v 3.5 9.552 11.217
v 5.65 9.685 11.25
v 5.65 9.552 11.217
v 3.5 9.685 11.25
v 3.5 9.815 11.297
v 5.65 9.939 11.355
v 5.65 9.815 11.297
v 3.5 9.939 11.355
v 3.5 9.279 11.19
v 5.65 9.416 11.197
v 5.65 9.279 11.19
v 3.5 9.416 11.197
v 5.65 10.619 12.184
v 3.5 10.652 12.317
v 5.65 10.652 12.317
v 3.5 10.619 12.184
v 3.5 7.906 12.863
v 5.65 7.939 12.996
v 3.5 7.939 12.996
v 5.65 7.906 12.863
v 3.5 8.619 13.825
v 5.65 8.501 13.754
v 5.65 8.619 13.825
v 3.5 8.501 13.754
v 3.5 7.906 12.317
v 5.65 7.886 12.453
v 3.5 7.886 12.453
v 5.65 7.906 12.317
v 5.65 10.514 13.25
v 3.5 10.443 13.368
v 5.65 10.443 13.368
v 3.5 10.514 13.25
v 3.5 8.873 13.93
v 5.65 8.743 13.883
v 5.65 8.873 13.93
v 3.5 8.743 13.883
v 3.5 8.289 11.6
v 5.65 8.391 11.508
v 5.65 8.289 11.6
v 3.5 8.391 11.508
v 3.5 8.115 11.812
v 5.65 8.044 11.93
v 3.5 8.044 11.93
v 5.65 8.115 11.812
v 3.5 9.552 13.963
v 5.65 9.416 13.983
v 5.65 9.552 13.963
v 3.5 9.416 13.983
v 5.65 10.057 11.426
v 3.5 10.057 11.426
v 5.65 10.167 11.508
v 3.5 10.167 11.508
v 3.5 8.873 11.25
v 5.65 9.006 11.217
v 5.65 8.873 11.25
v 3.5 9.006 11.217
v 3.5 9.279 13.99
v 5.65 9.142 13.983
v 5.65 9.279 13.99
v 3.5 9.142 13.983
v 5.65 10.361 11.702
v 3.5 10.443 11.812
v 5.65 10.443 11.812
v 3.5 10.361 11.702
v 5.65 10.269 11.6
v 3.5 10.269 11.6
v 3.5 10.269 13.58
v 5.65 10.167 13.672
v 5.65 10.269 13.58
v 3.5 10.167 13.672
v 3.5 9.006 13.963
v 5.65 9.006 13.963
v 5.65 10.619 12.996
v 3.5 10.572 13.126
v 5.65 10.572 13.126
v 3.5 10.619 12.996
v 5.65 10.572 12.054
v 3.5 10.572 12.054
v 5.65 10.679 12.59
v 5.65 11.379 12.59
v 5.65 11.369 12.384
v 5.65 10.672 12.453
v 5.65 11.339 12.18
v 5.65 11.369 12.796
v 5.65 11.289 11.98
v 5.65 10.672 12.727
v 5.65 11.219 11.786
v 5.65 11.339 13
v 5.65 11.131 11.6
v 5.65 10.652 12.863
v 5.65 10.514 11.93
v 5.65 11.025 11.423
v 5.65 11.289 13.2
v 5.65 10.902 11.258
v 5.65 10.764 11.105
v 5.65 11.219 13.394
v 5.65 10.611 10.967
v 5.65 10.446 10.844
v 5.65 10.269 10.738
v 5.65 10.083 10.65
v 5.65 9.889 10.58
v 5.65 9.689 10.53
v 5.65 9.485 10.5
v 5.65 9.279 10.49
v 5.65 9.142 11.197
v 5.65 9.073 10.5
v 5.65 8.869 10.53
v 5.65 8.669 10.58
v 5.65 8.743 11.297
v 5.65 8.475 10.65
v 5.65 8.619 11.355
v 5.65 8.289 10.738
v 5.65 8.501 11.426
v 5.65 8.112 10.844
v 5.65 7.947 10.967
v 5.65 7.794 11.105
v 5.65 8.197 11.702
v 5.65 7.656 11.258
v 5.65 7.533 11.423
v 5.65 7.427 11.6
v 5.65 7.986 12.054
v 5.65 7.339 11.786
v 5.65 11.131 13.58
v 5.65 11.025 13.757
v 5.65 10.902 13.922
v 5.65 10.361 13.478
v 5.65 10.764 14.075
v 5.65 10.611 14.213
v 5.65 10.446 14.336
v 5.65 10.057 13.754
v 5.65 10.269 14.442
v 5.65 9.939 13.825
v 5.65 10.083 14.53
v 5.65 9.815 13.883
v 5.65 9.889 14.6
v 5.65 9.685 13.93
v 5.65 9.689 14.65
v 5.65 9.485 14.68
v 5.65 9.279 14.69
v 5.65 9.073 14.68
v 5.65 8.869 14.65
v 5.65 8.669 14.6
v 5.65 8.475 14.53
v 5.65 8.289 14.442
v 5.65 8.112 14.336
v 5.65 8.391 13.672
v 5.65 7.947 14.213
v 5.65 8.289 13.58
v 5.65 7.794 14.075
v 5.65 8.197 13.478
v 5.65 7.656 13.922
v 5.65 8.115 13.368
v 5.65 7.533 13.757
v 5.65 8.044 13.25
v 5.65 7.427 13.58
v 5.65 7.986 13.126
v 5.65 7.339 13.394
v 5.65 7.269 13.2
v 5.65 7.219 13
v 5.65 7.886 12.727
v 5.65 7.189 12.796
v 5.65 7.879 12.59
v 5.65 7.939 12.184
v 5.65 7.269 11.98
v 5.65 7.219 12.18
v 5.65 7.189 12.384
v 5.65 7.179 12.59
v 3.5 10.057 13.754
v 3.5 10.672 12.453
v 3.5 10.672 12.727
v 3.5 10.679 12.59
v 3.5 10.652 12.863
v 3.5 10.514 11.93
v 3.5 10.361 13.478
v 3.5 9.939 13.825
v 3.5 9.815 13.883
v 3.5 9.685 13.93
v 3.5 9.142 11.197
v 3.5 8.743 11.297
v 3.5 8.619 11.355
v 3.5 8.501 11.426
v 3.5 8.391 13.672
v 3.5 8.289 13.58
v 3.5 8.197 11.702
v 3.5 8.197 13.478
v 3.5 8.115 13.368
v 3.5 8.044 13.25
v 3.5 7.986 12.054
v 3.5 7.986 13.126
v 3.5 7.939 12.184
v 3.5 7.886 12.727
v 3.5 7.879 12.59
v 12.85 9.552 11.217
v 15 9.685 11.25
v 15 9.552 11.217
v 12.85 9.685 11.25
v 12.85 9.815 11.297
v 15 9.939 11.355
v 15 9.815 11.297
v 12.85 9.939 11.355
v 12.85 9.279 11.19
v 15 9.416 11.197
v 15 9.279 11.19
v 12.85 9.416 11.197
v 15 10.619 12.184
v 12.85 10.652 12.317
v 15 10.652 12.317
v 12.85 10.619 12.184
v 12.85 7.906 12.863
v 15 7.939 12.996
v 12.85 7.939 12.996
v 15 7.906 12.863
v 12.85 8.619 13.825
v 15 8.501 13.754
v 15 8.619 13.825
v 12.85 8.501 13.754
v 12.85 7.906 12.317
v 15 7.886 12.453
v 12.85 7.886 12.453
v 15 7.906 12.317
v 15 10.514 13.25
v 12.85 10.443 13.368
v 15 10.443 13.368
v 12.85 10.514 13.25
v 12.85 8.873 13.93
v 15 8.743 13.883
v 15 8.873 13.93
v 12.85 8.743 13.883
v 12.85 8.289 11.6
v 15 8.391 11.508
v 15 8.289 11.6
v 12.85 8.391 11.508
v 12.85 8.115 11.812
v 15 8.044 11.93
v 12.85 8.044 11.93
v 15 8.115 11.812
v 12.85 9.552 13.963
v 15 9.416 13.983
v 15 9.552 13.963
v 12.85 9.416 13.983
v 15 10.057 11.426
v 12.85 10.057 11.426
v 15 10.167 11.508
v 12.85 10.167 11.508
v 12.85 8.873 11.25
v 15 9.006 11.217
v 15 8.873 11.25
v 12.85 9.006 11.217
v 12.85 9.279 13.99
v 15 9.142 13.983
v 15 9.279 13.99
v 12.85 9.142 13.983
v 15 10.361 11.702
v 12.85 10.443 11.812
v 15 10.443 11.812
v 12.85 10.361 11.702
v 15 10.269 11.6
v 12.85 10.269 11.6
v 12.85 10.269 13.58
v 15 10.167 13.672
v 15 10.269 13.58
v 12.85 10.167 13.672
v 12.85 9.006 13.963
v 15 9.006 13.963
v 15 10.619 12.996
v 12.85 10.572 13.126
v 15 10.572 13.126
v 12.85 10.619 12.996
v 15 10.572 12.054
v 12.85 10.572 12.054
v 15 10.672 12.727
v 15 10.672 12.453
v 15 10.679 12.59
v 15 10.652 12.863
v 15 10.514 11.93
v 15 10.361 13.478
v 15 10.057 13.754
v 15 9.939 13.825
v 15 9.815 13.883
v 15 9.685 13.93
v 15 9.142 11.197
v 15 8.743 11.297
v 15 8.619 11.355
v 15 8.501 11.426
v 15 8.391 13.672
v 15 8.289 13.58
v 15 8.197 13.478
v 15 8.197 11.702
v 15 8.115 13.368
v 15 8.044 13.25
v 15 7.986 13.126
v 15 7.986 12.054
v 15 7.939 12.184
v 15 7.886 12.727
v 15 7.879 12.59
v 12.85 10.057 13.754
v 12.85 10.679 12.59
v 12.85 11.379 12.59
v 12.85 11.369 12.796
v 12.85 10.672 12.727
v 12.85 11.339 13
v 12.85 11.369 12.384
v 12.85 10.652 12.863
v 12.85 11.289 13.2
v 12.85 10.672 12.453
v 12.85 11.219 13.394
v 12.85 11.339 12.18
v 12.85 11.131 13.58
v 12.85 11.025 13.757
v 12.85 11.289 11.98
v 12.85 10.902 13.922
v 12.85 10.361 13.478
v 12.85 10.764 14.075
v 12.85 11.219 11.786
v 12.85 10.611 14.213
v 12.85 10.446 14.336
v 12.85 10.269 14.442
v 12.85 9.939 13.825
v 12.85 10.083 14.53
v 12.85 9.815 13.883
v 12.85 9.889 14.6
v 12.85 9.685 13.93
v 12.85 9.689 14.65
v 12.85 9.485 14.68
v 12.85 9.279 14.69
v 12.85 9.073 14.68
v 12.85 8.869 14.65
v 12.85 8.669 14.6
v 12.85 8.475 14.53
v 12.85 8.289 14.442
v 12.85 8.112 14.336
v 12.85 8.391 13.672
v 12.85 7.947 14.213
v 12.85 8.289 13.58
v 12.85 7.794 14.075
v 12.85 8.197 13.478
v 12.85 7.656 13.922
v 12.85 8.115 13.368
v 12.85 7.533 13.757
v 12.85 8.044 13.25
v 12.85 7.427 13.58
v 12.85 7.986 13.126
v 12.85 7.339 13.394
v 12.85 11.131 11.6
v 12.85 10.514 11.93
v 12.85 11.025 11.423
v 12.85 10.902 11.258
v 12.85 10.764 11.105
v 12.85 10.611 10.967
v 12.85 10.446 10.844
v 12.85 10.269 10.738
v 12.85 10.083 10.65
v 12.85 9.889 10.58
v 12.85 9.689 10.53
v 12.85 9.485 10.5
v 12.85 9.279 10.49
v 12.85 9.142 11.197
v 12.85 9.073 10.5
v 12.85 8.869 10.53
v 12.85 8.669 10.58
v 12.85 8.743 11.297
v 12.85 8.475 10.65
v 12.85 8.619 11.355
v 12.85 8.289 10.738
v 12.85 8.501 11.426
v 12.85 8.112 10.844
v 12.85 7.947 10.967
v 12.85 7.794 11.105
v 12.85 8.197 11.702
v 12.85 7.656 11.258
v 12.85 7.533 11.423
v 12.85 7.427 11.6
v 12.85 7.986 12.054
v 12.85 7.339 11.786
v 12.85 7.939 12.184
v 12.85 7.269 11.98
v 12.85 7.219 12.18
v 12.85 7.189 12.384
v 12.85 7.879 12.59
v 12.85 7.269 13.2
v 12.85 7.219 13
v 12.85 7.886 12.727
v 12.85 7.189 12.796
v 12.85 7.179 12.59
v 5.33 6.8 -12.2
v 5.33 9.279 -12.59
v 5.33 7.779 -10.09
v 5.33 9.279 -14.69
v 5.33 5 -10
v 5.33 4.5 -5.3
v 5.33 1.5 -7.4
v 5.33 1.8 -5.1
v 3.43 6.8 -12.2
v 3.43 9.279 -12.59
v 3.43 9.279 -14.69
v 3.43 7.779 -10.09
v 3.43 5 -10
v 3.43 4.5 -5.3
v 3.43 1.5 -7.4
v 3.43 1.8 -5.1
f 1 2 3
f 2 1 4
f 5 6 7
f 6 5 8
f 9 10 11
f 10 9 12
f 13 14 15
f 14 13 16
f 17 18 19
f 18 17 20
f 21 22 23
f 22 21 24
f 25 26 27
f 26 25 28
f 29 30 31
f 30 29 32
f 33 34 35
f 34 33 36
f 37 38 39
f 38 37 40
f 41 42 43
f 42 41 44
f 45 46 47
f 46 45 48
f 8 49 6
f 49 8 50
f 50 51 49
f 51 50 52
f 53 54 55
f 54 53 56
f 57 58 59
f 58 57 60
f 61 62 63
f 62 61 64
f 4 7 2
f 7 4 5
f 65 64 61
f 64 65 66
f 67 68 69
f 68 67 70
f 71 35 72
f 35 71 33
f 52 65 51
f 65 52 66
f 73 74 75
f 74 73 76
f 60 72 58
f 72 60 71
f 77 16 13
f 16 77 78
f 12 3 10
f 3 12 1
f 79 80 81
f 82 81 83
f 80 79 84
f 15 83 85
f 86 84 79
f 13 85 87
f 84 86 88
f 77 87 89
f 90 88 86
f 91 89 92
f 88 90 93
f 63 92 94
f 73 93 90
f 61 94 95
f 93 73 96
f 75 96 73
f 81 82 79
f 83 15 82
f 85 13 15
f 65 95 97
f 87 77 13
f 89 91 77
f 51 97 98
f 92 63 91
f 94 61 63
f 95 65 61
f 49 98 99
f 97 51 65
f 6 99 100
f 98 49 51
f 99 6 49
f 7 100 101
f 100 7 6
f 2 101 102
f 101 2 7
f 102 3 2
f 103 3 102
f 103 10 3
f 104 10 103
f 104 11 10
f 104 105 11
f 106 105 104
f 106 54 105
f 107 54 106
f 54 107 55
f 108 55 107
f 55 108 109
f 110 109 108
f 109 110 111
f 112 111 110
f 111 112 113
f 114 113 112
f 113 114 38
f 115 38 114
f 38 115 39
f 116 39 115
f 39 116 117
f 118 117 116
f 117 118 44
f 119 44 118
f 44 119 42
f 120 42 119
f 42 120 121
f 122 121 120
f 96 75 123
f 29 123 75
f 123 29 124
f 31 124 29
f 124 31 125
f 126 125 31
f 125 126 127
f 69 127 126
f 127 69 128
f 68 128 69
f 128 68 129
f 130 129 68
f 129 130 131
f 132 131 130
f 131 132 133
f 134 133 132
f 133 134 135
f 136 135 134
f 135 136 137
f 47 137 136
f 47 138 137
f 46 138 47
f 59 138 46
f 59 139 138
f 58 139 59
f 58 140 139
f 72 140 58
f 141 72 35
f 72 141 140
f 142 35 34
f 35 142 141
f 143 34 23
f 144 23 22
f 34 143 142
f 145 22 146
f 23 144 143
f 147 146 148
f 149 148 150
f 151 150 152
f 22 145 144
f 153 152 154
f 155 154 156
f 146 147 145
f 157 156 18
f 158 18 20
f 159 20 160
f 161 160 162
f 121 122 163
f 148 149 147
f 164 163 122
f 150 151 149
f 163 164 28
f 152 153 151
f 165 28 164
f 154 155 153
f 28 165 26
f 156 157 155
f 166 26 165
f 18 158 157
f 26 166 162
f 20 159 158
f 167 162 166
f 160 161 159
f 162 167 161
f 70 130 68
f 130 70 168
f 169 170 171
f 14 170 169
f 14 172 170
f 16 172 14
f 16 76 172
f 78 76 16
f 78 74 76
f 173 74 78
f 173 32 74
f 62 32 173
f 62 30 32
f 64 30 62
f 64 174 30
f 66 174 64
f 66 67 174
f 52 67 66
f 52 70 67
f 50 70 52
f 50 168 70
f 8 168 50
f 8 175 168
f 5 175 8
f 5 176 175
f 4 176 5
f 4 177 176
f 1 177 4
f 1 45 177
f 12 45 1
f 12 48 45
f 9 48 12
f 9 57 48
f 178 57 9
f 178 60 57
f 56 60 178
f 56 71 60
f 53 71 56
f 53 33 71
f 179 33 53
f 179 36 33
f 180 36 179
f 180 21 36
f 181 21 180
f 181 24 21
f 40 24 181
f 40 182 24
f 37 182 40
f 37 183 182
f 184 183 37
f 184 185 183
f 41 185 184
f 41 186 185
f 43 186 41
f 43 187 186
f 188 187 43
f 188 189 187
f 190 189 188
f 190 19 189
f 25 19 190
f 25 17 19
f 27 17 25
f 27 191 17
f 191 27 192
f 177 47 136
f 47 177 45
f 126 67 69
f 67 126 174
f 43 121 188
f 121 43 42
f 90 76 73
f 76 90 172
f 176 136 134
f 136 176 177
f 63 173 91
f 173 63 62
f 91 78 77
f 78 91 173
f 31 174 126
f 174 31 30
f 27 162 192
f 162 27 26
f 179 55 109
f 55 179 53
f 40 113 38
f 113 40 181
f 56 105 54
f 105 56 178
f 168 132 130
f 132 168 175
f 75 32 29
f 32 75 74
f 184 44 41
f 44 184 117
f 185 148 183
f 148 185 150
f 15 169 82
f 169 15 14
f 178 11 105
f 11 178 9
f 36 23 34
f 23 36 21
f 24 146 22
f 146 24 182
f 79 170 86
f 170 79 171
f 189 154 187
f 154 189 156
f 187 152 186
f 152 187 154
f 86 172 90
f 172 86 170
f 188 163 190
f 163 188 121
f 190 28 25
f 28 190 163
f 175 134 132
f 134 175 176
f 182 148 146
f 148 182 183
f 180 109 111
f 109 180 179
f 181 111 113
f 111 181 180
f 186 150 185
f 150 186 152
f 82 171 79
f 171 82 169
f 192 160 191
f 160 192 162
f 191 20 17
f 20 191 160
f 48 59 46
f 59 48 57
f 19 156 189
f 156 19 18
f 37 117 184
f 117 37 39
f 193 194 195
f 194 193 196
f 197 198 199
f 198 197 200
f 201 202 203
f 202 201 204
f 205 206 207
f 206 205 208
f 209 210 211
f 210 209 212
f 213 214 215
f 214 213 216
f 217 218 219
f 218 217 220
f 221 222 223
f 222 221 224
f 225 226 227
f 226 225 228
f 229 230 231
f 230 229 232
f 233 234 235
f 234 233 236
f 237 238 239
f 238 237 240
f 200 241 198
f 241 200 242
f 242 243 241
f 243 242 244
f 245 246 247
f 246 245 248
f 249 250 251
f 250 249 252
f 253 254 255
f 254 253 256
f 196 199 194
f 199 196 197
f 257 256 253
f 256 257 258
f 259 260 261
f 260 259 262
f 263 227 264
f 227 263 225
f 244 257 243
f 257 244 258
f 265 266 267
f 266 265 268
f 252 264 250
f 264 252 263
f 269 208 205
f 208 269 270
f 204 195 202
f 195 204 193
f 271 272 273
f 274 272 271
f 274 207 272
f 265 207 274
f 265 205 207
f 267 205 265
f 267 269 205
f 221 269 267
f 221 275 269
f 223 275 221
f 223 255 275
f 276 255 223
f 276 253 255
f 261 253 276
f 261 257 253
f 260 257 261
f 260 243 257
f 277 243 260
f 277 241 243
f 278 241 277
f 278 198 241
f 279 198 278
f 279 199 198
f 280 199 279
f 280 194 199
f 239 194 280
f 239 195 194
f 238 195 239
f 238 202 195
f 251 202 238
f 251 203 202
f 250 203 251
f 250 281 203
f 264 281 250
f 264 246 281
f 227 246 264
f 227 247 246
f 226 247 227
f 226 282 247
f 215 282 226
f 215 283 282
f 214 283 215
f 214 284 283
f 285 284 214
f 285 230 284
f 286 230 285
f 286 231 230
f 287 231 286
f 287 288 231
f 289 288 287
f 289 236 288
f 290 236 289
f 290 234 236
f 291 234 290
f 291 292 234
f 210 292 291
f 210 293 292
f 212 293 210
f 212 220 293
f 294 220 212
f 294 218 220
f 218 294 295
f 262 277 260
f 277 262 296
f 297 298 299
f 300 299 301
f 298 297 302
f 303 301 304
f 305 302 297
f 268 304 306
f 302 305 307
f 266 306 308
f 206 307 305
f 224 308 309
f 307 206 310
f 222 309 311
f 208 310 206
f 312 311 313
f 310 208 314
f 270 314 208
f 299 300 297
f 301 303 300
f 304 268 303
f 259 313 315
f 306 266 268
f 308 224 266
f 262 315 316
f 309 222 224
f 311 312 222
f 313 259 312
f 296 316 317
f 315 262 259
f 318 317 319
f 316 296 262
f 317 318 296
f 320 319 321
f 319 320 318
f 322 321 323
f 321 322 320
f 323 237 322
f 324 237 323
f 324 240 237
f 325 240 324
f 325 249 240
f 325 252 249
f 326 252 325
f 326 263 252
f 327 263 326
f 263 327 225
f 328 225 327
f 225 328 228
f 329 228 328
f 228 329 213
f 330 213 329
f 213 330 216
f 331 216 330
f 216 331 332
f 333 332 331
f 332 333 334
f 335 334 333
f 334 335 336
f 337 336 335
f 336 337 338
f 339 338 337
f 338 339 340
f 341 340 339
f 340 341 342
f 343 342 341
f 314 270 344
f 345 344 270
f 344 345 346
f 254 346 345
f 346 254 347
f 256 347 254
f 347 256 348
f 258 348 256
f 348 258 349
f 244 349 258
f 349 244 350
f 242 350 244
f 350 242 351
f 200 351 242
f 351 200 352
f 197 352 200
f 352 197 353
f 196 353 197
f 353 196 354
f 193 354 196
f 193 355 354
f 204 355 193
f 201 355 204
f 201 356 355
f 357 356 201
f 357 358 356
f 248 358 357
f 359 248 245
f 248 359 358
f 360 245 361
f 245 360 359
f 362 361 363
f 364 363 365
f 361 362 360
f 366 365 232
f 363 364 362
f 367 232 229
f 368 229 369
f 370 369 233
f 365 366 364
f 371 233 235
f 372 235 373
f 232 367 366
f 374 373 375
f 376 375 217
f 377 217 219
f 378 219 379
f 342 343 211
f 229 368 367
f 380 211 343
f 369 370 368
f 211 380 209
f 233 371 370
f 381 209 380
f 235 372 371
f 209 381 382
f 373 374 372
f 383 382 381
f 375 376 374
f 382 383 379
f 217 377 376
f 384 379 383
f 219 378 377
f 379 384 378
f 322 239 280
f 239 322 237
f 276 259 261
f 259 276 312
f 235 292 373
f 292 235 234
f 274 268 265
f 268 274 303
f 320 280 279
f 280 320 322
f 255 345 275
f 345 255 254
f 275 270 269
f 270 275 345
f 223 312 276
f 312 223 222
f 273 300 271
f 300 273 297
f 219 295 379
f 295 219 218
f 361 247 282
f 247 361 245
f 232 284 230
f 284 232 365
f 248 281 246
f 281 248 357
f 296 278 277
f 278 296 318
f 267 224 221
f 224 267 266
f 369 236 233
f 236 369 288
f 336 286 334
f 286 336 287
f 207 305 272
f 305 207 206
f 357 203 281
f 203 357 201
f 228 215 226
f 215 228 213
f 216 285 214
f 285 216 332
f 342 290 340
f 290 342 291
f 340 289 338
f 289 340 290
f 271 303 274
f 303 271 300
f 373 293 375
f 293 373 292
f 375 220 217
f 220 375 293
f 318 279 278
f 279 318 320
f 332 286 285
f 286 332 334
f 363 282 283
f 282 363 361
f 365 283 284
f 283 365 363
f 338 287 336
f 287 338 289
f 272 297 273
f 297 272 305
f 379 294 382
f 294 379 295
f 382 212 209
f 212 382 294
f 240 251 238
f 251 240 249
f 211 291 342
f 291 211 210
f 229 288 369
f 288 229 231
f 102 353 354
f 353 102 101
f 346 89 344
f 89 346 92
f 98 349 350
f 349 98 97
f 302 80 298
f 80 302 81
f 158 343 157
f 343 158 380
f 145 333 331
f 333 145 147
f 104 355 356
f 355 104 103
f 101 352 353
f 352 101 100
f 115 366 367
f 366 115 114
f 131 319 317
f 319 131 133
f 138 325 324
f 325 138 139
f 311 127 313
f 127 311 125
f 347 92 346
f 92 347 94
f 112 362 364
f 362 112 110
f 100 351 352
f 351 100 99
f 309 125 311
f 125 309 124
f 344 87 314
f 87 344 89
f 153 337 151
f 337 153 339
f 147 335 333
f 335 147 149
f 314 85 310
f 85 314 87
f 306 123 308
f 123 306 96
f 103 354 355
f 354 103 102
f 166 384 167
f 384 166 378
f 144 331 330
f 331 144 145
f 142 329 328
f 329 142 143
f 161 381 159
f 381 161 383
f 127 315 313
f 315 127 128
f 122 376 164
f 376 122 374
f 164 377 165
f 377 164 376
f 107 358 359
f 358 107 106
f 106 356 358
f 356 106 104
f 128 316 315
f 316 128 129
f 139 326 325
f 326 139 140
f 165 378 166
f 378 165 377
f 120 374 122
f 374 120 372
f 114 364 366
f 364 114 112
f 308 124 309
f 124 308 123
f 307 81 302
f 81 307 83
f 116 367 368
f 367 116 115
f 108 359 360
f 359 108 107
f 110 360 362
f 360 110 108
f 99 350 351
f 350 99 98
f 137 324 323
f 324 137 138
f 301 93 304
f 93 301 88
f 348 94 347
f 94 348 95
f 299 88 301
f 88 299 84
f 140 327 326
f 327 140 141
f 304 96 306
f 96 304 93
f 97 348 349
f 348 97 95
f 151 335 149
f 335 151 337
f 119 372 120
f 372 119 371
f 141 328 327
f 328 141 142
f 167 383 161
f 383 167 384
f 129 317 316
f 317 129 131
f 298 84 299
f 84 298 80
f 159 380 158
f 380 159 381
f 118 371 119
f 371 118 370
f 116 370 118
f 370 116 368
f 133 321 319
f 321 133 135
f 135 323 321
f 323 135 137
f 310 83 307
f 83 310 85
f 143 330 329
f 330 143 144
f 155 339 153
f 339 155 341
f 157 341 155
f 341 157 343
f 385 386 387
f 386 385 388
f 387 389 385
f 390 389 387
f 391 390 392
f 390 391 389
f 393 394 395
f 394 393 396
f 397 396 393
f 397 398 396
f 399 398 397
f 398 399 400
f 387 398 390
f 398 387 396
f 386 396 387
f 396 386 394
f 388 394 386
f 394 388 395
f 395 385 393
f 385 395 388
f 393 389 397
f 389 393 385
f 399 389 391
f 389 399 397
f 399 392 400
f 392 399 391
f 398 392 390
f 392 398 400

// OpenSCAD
// Parametric OEM 3-Rib Shaft & Rocker Mechanism for Kia Socket Enclosure
// Generated by build_shaft.py

$fn = 64;

// Global Parameters (mm)
total_axle_len = 11.5;
hub_w = 7.2;
pin_d = 2.8;
pin_len = 2.15;
hub_d = 4.2;

plunger_reach_below_z = 6.5;
plunger_w = 3.6;
hole_x_c = 10.284;

cam_w = 1.9;
cam_x_c = 6.28;
x_c = 9.25;
y_axle = 9.279;
z_axle = 12.59;

// 2D Profile: High-Sensitivity Direct Belly Cam (calibrated for 10.5mm blade penetration)
poly_cam_pts = [
    [9.279, 12.59],
    [9.279, 14.69],
    [6.80, 12.20],
    [5.00, 10.00],
    [1.50, 7.40],
    [1.80, 5.10],
    [4.50, 5.30],
    [7.779, 10.09]
];

module oem_shaft_rocker() {
    // Left Pivot Pin
    translate([x_c - hub_w/2 - pin_len/2, y_axle, z_axle])
        rotate([0, 90, 0])
            cylinder(r = pin_d/2, h = pin_len, center = true);
            
    // Right Pivot Pin
    translate([x_c + hub_w/2 + pin_len/2, y_axle, z_axle])
        rotate([0, 90, 0])
            cylinder(r = pin_d/2, h = pin_len, center = true);
            
    // Central Hub Barrel
    translate([x_c, y_axle, z_axle])
        rotate([0, 90, 0])
            cylinder(r = hub_d/2, h = hub_w, center = true);
            
    // Direct Straight Belly Cam Tab
    translate([cam_x_c - cam_w/2, 0, 0])
        rotate([0, -90, 0])
            rotate([0, 0, 90])
                linear_extrude(height = cam_w)
                    polygon(poly_cam_pts);
}

oem_shaft_rocker();
